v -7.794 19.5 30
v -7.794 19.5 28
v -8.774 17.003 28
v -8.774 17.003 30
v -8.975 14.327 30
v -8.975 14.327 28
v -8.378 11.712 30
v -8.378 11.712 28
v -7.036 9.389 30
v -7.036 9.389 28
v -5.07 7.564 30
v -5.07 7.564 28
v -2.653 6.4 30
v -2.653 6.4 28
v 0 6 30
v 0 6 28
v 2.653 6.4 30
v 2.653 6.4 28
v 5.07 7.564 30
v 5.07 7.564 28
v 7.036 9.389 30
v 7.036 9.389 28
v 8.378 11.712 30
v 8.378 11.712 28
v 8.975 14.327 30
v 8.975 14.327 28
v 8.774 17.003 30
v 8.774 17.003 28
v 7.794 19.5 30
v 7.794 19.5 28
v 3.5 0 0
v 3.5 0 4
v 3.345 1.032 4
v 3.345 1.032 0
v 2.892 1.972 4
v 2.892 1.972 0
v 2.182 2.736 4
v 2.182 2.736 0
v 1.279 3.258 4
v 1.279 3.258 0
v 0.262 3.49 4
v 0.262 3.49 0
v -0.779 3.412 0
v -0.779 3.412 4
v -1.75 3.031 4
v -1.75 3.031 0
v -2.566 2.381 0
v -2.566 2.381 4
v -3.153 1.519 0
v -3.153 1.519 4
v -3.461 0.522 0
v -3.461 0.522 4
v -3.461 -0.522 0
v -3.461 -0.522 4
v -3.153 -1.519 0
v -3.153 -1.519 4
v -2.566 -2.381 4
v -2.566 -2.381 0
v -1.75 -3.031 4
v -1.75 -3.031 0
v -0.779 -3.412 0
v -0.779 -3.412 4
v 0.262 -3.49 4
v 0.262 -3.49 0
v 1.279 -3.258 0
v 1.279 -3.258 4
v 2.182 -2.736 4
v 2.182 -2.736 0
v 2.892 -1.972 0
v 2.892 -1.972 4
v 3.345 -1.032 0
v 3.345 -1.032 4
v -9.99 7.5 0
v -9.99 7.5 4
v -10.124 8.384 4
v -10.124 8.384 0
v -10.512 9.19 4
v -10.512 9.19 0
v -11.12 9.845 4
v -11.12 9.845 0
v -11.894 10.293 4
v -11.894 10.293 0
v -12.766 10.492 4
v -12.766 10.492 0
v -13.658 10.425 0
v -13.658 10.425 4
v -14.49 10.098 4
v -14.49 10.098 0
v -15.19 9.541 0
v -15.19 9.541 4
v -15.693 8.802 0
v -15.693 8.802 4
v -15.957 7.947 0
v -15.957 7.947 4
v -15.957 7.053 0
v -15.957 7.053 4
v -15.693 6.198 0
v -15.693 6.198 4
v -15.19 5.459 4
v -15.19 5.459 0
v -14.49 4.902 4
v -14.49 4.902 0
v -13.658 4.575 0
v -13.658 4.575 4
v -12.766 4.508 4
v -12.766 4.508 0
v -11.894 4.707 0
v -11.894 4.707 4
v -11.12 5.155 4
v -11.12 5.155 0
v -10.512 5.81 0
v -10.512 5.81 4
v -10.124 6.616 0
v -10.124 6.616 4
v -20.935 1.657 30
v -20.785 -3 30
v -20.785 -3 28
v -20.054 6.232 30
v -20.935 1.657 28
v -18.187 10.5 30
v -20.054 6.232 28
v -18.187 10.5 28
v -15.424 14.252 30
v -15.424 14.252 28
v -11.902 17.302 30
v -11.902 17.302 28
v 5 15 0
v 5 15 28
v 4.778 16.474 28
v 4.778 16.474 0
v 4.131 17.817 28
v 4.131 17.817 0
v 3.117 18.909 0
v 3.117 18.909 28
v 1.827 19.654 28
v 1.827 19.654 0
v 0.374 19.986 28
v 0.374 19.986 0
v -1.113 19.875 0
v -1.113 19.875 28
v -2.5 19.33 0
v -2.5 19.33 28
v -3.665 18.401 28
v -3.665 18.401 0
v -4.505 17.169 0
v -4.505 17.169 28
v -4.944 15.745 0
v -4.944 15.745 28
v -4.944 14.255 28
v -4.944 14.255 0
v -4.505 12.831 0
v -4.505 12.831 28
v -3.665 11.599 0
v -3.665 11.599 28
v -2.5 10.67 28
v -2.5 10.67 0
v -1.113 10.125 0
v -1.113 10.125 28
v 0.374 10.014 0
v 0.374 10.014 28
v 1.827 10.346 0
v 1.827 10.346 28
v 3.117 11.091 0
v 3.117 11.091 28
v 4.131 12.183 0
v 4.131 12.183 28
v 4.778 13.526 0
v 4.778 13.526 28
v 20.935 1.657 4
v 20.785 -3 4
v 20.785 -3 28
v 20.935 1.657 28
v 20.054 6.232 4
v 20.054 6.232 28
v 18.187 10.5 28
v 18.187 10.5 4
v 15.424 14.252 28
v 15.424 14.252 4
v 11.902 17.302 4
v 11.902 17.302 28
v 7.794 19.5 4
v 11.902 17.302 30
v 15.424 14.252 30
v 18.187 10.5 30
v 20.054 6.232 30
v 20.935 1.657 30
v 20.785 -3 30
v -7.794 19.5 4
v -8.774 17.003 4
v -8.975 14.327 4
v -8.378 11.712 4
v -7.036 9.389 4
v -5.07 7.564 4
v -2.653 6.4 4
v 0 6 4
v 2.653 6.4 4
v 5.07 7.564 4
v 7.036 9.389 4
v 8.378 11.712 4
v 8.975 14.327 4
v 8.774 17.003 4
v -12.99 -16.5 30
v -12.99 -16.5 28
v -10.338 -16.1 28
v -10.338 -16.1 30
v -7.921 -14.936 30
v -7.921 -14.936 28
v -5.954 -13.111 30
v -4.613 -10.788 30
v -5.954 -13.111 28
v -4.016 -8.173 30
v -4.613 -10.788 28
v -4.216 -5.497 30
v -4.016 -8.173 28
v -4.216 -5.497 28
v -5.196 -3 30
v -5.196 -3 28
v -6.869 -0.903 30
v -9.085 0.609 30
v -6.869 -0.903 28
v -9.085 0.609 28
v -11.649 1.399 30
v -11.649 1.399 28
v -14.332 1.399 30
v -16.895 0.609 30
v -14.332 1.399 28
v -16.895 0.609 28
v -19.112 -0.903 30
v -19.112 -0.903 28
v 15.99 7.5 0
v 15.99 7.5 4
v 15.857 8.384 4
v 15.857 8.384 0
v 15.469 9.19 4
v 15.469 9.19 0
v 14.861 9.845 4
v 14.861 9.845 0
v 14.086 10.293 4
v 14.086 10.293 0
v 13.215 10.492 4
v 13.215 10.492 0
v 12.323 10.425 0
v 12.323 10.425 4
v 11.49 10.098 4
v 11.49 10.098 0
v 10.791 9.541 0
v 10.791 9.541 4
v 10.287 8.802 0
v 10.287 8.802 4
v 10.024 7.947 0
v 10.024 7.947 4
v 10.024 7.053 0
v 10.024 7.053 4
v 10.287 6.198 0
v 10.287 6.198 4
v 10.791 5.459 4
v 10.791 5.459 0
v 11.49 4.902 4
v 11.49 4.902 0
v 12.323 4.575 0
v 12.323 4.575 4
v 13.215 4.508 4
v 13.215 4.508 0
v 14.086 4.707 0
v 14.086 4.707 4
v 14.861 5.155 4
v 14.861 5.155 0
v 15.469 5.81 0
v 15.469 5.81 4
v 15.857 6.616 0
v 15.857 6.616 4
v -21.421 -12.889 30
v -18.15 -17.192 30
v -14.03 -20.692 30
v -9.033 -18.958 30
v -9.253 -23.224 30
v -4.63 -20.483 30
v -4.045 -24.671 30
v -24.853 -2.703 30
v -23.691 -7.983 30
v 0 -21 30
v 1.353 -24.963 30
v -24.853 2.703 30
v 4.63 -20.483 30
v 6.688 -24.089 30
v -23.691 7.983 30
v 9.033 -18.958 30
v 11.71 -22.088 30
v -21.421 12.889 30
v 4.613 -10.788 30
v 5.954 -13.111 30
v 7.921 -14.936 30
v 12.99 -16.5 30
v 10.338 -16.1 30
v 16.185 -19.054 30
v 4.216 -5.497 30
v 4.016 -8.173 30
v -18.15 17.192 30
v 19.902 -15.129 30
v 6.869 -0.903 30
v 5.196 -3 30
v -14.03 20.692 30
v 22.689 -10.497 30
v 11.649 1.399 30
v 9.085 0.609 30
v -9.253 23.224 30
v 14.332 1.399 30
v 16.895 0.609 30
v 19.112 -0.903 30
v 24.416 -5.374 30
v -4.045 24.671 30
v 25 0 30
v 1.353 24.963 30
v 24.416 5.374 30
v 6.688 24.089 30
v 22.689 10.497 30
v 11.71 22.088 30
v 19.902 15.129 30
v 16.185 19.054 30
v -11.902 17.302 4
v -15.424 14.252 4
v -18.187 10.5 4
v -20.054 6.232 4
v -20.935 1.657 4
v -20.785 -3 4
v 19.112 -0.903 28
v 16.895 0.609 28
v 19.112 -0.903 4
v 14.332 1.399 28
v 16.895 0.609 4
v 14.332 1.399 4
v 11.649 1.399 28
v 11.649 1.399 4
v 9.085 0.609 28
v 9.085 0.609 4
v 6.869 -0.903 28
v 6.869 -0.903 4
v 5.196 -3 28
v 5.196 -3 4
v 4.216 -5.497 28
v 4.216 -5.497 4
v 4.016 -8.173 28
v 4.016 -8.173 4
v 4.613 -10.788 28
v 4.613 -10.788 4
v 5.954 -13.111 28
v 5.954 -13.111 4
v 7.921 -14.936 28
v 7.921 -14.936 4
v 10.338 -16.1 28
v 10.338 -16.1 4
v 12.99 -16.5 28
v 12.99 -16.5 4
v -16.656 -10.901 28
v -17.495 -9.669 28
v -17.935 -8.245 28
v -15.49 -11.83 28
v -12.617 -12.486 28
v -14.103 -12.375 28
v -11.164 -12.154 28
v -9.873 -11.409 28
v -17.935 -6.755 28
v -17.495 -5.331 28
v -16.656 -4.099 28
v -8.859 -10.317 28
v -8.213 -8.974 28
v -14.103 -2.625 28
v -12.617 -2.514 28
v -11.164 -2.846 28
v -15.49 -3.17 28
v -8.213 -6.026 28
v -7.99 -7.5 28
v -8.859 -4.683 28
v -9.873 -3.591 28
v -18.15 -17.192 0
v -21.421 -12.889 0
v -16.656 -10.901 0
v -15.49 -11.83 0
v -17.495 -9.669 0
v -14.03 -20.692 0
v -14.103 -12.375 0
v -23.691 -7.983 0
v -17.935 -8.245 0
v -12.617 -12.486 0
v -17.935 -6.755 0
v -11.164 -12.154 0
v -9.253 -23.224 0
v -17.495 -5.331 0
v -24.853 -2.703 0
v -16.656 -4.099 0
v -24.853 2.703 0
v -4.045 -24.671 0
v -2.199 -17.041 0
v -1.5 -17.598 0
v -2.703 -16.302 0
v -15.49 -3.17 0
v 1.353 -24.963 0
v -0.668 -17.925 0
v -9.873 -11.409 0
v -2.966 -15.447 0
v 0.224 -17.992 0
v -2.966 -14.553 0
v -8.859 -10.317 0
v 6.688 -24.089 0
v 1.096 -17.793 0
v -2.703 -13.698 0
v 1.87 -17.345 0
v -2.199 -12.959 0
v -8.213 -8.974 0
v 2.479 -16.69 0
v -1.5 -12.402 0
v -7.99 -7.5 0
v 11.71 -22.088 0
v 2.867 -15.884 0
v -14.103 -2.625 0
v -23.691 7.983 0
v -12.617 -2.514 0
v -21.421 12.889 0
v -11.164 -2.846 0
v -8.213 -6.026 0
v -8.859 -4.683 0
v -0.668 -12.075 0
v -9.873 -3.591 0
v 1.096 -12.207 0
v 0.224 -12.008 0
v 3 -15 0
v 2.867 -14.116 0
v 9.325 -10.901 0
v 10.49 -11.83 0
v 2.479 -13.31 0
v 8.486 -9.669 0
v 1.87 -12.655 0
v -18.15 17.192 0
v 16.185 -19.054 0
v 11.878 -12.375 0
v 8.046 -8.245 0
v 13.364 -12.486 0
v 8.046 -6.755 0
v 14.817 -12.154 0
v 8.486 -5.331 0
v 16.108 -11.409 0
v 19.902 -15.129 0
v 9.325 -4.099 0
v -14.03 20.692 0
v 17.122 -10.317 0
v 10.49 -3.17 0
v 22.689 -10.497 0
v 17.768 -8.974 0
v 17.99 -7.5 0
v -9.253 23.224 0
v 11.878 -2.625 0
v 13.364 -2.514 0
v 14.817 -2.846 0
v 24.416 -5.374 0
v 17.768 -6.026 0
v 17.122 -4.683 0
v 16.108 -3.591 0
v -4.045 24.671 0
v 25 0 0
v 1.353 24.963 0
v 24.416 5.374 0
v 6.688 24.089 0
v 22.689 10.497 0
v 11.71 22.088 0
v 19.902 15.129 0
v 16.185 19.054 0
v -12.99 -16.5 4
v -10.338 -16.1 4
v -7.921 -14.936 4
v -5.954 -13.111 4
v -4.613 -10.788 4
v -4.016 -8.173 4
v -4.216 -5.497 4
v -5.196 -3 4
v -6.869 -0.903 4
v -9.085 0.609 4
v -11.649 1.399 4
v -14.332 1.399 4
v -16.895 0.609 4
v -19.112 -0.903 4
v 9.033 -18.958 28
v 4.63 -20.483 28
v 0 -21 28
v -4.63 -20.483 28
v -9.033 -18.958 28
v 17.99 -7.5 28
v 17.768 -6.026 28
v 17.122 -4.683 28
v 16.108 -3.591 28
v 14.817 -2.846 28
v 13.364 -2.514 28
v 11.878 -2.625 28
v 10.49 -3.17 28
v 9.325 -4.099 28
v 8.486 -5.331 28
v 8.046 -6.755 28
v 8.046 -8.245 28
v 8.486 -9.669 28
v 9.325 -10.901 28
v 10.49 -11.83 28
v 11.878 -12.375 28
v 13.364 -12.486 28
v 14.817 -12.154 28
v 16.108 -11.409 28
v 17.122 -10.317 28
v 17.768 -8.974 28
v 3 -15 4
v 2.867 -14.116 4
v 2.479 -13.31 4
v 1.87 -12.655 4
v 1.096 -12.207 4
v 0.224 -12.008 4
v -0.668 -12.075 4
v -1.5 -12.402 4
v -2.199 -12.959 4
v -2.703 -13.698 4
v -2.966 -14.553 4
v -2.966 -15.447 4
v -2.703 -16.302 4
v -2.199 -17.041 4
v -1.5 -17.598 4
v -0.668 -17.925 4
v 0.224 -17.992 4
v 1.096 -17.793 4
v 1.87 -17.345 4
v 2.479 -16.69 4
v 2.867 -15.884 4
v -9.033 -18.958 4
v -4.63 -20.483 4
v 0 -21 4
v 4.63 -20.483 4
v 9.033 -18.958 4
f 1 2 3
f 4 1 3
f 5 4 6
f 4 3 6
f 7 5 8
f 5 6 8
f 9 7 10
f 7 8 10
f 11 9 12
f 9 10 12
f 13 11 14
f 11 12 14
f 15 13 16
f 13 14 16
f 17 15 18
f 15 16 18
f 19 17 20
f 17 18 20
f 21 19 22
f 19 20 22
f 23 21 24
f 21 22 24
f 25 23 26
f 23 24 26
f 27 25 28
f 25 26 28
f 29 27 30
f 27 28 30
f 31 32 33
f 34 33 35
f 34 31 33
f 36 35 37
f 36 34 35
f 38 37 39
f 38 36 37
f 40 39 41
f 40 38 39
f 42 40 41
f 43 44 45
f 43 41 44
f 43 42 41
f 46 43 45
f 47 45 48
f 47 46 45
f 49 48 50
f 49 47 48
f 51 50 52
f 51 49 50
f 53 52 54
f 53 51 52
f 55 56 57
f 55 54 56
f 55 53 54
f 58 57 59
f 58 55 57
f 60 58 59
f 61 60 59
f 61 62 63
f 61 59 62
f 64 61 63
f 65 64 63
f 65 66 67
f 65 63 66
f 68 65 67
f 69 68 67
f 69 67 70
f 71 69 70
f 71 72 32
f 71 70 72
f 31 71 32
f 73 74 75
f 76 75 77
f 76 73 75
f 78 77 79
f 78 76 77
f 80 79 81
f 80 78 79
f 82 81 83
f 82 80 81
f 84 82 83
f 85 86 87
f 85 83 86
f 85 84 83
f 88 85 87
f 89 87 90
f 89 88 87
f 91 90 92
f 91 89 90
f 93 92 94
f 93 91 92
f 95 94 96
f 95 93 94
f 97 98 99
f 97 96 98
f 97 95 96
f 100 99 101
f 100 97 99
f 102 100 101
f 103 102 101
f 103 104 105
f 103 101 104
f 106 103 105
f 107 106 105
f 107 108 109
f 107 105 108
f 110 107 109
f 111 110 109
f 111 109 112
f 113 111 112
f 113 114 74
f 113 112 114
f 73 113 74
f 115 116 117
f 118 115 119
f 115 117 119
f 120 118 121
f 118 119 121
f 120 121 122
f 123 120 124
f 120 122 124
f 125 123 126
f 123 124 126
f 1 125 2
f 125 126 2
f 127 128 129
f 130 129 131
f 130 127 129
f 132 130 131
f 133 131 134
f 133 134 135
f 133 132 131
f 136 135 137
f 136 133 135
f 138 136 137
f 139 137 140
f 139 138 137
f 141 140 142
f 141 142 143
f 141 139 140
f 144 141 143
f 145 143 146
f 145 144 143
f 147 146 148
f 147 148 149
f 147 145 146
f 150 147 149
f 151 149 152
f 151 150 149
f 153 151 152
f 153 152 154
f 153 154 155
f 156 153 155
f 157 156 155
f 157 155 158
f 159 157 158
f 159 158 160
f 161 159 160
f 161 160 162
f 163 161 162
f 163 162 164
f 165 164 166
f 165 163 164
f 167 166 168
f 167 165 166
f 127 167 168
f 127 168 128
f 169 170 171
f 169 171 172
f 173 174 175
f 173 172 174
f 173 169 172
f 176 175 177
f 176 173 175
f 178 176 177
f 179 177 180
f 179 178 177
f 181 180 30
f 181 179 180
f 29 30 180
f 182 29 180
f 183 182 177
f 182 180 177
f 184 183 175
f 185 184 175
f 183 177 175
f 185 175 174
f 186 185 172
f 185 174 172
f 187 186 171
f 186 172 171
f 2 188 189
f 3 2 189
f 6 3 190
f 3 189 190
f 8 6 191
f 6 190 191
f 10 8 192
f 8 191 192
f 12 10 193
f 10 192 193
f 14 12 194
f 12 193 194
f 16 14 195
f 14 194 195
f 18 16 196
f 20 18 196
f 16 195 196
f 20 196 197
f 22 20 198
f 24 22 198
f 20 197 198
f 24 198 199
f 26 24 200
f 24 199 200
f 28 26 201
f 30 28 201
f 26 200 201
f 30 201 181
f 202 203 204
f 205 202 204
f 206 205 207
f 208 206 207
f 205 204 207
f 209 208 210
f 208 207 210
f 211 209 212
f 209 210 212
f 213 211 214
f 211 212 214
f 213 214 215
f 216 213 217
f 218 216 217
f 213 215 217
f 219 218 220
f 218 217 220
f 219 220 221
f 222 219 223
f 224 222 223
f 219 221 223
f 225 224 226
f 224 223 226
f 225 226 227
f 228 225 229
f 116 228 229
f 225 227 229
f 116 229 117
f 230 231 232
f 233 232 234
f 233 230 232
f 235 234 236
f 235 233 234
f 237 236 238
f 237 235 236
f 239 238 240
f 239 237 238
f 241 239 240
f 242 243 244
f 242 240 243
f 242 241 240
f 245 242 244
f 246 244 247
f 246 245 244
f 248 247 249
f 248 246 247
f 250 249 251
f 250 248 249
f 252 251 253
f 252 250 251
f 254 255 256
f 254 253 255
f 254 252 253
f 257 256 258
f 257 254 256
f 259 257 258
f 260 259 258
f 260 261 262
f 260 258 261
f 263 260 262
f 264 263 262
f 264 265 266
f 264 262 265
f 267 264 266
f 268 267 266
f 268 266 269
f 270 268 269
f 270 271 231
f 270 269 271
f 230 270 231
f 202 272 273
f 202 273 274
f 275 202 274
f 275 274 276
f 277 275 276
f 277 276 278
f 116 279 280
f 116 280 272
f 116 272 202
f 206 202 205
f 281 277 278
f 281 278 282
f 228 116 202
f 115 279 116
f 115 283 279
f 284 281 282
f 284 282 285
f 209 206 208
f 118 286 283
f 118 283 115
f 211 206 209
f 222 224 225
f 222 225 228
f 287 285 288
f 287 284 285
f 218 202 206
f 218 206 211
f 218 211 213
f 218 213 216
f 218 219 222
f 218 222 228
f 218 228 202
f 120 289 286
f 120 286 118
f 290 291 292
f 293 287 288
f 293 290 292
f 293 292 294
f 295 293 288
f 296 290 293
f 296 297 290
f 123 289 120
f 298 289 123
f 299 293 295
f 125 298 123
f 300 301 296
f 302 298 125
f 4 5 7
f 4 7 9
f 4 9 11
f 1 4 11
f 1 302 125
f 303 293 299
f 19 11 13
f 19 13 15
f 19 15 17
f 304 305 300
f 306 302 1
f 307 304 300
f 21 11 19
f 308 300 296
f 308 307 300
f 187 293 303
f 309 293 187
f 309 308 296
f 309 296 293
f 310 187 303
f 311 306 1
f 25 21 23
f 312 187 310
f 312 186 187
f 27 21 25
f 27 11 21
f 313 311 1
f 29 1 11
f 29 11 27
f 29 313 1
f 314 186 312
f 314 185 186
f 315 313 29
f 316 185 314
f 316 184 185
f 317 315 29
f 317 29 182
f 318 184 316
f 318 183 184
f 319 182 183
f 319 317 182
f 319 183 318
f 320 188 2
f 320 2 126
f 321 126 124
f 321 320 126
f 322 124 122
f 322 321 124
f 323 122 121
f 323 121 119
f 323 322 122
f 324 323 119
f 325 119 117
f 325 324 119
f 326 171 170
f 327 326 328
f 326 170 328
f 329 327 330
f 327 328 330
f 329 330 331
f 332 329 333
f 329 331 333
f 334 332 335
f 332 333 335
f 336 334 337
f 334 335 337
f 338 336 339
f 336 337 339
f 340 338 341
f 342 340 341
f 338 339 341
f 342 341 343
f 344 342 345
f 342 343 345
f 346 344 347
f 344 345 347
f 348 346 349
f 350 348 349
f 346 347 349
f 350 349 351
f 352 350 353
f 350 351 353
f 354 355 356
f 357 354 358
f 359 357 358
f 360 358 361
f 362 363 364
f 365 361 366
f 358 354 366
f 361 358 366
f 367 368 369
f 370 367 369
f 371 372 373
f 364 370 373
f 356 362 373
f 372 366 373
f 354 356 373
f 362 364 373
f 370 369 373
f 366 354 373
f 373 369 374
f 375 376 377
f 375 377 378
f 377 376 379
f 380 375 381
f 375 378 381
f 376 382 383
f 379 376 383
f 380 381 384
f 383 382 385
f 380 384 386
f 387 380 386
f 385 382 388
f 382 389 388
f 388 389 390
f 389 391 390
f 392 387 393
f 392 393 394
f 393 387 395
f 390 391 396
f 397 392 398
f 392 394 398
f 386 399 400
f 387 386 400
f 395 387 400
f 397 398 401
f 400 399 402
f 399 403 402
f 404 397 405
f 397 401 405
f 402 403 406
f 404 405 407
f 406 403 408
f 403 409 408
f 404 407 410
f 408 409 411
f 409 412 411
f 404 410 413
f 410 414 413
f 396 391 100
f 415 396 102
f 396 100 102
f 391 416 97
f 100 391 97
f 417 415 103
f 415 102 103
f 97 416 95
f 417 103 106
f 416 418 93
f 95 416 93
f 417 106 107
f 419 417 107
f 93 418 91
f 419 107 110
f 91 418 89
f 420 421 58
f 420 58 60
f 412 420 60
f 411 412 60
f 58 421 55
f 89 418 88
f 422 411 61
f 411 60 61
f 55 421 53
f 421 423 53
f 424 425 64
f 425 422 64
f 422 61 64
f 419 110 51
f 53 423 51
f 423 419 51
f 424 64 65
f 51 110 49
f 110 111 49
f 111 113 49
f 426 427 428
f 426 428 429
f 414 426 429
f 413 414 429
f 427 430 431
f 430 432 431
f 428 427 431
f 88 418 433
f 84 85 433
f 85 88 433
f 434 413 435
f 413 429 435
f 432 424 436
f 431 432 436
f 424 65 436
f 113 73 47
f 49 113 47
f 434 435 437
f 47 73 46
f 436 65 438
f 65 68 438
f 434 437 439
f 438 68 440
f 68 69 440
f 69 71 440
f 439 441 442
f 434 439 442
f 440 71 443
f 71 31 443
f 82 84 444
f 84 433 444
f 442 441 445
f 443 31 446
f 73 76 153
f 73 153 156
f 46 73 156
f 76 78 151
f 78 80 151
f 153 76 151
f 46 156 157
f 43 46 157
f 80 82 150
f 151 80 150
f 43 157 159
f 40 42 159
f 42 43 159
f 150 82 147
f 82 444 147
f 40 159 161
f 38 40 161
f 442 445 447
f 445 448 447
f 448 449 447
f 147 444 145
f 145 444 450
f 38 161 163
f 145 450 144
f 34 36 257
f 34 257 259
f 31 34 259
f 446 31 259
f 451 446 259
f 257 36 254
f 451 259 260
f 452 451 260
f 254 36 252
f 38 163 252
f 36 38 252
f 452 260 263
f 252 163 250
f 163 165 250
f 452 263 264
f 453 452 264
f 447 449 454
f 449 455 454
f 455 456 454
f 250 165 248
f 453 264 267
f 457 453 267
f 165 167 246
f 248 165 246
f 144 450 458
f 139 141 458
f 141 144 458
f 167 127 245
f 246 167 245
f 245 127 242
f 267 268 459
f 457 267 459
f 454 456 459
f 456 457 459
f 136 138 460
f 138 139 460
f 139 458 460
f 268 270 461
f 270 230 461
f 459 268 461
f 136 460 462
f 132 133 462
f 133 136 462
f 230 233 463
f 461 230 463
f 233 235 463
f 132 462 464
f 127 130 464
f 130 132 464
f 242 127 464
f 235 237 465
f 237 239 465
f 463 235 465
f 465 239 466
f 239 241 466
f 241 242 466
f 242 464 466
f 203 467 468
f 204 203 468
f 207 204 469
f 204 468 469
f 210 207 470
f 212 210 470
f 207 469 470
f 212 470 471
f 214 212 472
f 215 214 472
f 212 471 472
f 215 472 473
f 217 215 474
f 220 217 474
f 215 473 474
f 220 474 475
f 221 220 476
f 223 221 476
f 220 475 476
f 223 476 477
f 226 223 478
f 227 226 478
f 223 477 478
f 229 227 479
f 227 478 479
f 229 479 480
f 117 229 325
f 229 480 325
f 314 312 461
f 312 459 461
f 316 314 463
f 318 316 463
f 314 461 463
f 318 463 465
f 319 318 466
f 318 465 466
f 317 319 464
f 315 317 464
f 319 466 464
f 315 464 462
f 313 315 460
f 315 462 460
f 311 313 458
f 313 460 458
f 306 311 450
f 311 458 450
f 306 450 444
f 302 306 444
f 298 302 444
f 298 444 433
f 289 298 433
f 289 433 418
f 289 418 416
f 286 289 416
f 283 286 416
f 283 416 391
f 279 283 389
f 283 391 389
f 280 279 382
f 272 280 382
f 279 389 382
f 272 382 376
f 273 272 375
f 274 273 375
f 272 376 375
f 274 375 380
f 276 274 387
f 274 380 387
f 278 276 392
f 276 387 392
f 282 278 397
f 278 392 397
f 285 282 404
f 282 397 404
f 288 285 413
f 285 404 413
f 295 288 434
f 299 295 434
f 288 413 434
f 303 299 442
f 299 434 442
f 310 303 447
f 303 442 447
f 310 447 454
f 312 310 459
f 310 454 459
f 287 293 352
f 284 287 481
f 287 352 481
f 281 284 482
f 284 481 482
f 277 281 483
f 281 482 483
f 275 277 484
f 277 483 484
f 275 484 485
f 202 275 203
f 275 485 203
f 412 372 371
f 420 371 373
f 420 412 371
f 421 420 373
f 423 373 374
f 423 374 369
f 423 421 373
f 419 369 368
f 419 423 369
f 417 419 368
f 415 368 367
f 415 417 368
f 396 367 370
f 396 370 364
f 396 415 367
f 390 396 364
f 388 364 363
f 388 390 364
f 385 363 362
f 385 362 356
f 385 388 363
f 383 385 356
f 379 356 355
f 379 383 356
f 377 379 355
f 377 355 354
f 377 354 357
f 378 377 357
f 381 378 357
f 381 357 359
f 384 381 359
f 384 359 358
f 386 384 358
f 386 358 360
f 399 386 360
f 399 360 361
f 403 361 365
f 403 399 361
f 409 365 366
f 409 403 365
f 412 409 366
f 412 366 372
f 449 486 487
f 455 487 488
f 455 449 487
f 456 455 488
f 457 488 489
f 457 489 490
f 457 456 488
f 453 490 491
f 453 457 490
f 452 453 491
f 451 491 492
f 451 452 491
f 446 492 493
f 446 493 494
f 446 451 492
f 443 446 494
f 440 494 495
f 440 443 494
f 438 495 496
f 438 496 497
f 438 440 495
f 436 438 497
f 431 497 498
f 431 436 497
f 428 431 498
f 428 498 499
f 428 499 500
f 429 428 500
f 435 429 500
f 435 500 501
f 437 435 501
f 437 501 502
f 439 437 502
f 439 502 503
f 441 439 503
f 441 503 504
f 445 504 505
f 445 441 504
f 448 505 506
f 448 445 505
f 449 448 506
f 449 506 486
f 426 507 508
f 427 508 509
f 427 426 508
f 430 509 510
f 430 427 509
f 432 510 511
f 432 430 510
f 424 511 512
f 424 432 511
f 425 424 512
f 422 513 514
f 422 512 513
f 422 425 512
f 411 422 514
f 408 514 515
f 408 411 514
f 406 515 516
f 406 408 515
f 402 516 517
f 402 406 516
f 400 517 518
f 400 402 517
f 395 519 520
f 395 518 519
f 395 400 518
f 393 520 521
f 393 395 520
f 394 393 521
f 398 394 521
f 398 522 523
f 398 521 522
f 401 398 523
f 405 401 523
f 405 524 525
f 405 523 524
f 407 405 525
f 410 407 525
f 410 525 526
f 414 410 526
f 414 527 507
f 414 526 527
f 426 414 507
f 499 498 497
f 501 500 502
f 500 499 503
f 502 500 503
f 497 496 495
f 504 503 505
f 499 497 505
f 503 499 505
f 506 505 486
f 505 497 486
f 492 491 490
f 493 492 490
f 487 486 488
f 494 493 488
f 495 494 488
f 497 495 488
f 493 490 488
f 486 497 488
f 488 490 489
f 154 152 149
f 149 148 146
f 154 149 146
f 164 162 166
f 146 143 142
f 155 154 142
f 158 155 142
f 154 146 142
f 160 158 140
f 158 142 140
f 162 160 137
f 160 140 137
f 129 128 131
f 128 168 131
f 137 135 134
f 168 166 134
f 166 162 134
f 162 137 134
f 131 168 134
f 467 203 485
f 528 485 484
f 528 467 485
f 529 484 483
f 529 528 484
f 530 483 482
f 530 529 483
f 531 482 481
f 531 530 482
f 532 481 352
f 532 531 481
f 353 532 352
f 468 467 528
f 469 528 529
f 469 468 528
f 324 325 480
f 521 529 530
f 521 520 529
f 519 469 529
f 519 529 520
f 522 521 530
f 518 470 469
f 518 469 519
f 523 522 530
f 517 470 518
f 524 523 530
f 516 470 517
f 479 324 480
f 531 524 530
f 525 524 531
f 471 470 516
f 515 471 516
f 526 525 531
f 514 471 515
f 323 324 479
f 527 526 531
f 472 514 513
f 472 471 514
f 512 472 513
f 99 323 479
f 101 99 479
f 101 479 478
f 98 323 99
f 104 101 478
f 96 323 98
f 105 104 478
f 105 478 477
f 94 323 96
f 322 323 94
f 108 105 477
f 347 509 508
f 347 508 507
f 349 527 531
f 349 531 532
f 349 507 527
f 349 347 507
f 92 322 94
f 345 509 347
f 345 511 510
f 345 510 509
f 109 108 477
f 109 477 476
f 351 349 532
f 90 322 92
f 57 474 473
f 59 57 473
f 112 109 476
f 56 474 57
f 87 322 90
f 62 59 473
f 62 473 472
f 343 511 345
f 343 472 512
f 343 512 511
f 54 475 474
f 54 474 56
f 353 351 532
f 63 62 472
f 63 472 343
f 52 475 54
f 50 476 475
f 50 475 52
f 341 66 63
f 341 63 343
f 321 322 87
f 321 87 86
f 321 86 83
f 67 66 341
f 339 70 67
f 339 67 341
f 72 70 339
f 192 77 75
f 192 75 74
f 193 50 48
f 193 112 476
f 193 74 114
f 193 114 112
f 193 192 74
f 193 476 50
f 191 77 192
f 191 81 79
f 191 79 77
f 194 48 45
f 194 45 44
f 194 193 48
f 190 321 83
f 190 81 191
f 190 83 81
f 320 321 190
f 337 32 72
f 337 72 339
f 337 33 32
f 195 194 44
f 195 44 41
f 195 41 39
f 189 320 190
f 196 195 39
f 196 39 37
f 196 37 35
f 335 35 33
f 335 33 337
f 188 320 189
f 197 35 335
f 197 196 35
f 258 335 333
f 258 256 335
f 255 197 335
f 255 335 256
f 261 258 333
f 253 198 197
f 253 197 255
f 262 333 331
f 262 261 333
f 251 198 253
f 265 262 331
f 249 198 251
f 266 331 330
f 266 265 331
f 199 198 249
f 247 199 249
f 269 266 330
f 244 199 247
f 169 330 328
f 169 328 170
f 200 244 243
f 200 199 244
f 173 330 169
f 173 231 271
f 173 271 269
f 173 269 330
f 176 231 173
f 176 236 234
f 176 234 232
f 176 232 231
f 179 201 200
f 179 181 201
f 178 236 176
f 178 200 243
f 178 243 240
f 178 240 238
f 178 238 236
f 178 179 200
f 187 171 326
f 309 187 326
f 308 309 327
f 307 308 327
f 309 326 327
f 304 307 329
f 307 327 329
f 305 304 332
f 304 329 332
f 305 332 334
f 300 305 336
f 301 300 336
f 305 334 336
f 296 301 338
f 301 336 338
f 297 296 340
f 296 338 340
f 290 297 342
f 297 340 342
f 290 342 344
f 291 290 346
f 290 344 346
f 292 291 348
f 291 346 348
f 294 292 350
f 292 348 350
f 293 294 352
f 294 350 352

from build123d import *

# Parameters (mm, degrees)
F0_R     = 25
F0_R_2   = 5
F0_R_3   = 3
F0_R_4   = 3.5
F1_DEPTH = 28
F2_T     = -4
F3_DEPTH = 25
F4_R     = 25
F5_DEPTH = 2


# Not quite as in the source:
# - a feature names something its author has since deleted; it is built from what else it names


with BuildPart() as f1:
    # F0 (on Top) → F1 (new body)
    with BuildSketch(Plane.XY):
        Circle(F0_R)
        with Locations((-12.990381, -7.5)):
            Circle(F0_R_2, mode=Mode.SUBTRACT)
        with Locations((0, -15)):
            Circle(F0_R_3, mode=Mode.SUBTRACT)
        with Locations((12.990381, -7.5)):
            Circle(F0_R_2, mode=Mode.SUBTRACT)
        with Locations((-12.990381, 7.5)):
            Circle(F0_R_3, mode=Mode.SUBTRACT)
        Circle(F0_R_4, mode=Mode.SUBTRACT)
        with Locations((12.990381, 7.5)):
            Circle(F0_R_3, mode=Mode.SUBTRACT)
        with Locations((0, 15)):
            Circle(F0_R_2, mode=Mode.SUBTRACT)
        Circle(F0_R_4)
        with Locations((-12.990381, 7.5)):
            Circle(F0_R_3)
        with Locations((12.990381, 7.5)):
            Circle(F0_R_3)
        with Locations((0, -15)):
            Circle(F0_R_3)
    extrude(amount=F1_DEPTH)

    # F2
    f2_openings = [f1.faces().sort_by_distance(p)[0] for p in [
        (0, 0, 28),
    ]]
    offset(amount=F2_T, openings=f2_openings)

    # F0 (on Top) → F3 (cut)
    with BuildSketch(Plane.XY):
        with Locations((-12.990381, 7.5)):
            Circle(F0_R_3)
        Circle(F0_R_4)
        with Locations((12.990381, 7.5)):
            Circle(F0_R_3)
        with Locations((0, -15)):
            Circle(F0_R_3)
    extrude(amount=F3_DEPTH, mode=Mode.SUBTRACT)

    # F4 (on face) → F5 (join)
    with BuildSketch(Plane.XY.offset(28)):
        Circle(F4_R)
        with BuildLine():
            ThreePointArc((-20.78461, -3), (-18.186533, 10.5), (-7.794229, 19.5))
            ThreePointArc((-7.794229, 19.5), (0, 6), (7.794229, 19.5))
            ThreePointArc((7.794229, 19.5), (18.186533, 10.5), (20.78461, -3))
            ThreePointArc((20.78461, -3), (5.196152, -3), (12.990381, -16.5))
            ThreePointArc((12.990381, -16.5), (0, -21), (-12.990381, -16.5))
            ThreePointArc((-12.990381, -16.5), (-5.196152, -3), (-20.78461, -3))
        make_face(mode=Mode.SUBTRACT)
    extrude(amount=F5_DEPTH)


solid = f1.part
